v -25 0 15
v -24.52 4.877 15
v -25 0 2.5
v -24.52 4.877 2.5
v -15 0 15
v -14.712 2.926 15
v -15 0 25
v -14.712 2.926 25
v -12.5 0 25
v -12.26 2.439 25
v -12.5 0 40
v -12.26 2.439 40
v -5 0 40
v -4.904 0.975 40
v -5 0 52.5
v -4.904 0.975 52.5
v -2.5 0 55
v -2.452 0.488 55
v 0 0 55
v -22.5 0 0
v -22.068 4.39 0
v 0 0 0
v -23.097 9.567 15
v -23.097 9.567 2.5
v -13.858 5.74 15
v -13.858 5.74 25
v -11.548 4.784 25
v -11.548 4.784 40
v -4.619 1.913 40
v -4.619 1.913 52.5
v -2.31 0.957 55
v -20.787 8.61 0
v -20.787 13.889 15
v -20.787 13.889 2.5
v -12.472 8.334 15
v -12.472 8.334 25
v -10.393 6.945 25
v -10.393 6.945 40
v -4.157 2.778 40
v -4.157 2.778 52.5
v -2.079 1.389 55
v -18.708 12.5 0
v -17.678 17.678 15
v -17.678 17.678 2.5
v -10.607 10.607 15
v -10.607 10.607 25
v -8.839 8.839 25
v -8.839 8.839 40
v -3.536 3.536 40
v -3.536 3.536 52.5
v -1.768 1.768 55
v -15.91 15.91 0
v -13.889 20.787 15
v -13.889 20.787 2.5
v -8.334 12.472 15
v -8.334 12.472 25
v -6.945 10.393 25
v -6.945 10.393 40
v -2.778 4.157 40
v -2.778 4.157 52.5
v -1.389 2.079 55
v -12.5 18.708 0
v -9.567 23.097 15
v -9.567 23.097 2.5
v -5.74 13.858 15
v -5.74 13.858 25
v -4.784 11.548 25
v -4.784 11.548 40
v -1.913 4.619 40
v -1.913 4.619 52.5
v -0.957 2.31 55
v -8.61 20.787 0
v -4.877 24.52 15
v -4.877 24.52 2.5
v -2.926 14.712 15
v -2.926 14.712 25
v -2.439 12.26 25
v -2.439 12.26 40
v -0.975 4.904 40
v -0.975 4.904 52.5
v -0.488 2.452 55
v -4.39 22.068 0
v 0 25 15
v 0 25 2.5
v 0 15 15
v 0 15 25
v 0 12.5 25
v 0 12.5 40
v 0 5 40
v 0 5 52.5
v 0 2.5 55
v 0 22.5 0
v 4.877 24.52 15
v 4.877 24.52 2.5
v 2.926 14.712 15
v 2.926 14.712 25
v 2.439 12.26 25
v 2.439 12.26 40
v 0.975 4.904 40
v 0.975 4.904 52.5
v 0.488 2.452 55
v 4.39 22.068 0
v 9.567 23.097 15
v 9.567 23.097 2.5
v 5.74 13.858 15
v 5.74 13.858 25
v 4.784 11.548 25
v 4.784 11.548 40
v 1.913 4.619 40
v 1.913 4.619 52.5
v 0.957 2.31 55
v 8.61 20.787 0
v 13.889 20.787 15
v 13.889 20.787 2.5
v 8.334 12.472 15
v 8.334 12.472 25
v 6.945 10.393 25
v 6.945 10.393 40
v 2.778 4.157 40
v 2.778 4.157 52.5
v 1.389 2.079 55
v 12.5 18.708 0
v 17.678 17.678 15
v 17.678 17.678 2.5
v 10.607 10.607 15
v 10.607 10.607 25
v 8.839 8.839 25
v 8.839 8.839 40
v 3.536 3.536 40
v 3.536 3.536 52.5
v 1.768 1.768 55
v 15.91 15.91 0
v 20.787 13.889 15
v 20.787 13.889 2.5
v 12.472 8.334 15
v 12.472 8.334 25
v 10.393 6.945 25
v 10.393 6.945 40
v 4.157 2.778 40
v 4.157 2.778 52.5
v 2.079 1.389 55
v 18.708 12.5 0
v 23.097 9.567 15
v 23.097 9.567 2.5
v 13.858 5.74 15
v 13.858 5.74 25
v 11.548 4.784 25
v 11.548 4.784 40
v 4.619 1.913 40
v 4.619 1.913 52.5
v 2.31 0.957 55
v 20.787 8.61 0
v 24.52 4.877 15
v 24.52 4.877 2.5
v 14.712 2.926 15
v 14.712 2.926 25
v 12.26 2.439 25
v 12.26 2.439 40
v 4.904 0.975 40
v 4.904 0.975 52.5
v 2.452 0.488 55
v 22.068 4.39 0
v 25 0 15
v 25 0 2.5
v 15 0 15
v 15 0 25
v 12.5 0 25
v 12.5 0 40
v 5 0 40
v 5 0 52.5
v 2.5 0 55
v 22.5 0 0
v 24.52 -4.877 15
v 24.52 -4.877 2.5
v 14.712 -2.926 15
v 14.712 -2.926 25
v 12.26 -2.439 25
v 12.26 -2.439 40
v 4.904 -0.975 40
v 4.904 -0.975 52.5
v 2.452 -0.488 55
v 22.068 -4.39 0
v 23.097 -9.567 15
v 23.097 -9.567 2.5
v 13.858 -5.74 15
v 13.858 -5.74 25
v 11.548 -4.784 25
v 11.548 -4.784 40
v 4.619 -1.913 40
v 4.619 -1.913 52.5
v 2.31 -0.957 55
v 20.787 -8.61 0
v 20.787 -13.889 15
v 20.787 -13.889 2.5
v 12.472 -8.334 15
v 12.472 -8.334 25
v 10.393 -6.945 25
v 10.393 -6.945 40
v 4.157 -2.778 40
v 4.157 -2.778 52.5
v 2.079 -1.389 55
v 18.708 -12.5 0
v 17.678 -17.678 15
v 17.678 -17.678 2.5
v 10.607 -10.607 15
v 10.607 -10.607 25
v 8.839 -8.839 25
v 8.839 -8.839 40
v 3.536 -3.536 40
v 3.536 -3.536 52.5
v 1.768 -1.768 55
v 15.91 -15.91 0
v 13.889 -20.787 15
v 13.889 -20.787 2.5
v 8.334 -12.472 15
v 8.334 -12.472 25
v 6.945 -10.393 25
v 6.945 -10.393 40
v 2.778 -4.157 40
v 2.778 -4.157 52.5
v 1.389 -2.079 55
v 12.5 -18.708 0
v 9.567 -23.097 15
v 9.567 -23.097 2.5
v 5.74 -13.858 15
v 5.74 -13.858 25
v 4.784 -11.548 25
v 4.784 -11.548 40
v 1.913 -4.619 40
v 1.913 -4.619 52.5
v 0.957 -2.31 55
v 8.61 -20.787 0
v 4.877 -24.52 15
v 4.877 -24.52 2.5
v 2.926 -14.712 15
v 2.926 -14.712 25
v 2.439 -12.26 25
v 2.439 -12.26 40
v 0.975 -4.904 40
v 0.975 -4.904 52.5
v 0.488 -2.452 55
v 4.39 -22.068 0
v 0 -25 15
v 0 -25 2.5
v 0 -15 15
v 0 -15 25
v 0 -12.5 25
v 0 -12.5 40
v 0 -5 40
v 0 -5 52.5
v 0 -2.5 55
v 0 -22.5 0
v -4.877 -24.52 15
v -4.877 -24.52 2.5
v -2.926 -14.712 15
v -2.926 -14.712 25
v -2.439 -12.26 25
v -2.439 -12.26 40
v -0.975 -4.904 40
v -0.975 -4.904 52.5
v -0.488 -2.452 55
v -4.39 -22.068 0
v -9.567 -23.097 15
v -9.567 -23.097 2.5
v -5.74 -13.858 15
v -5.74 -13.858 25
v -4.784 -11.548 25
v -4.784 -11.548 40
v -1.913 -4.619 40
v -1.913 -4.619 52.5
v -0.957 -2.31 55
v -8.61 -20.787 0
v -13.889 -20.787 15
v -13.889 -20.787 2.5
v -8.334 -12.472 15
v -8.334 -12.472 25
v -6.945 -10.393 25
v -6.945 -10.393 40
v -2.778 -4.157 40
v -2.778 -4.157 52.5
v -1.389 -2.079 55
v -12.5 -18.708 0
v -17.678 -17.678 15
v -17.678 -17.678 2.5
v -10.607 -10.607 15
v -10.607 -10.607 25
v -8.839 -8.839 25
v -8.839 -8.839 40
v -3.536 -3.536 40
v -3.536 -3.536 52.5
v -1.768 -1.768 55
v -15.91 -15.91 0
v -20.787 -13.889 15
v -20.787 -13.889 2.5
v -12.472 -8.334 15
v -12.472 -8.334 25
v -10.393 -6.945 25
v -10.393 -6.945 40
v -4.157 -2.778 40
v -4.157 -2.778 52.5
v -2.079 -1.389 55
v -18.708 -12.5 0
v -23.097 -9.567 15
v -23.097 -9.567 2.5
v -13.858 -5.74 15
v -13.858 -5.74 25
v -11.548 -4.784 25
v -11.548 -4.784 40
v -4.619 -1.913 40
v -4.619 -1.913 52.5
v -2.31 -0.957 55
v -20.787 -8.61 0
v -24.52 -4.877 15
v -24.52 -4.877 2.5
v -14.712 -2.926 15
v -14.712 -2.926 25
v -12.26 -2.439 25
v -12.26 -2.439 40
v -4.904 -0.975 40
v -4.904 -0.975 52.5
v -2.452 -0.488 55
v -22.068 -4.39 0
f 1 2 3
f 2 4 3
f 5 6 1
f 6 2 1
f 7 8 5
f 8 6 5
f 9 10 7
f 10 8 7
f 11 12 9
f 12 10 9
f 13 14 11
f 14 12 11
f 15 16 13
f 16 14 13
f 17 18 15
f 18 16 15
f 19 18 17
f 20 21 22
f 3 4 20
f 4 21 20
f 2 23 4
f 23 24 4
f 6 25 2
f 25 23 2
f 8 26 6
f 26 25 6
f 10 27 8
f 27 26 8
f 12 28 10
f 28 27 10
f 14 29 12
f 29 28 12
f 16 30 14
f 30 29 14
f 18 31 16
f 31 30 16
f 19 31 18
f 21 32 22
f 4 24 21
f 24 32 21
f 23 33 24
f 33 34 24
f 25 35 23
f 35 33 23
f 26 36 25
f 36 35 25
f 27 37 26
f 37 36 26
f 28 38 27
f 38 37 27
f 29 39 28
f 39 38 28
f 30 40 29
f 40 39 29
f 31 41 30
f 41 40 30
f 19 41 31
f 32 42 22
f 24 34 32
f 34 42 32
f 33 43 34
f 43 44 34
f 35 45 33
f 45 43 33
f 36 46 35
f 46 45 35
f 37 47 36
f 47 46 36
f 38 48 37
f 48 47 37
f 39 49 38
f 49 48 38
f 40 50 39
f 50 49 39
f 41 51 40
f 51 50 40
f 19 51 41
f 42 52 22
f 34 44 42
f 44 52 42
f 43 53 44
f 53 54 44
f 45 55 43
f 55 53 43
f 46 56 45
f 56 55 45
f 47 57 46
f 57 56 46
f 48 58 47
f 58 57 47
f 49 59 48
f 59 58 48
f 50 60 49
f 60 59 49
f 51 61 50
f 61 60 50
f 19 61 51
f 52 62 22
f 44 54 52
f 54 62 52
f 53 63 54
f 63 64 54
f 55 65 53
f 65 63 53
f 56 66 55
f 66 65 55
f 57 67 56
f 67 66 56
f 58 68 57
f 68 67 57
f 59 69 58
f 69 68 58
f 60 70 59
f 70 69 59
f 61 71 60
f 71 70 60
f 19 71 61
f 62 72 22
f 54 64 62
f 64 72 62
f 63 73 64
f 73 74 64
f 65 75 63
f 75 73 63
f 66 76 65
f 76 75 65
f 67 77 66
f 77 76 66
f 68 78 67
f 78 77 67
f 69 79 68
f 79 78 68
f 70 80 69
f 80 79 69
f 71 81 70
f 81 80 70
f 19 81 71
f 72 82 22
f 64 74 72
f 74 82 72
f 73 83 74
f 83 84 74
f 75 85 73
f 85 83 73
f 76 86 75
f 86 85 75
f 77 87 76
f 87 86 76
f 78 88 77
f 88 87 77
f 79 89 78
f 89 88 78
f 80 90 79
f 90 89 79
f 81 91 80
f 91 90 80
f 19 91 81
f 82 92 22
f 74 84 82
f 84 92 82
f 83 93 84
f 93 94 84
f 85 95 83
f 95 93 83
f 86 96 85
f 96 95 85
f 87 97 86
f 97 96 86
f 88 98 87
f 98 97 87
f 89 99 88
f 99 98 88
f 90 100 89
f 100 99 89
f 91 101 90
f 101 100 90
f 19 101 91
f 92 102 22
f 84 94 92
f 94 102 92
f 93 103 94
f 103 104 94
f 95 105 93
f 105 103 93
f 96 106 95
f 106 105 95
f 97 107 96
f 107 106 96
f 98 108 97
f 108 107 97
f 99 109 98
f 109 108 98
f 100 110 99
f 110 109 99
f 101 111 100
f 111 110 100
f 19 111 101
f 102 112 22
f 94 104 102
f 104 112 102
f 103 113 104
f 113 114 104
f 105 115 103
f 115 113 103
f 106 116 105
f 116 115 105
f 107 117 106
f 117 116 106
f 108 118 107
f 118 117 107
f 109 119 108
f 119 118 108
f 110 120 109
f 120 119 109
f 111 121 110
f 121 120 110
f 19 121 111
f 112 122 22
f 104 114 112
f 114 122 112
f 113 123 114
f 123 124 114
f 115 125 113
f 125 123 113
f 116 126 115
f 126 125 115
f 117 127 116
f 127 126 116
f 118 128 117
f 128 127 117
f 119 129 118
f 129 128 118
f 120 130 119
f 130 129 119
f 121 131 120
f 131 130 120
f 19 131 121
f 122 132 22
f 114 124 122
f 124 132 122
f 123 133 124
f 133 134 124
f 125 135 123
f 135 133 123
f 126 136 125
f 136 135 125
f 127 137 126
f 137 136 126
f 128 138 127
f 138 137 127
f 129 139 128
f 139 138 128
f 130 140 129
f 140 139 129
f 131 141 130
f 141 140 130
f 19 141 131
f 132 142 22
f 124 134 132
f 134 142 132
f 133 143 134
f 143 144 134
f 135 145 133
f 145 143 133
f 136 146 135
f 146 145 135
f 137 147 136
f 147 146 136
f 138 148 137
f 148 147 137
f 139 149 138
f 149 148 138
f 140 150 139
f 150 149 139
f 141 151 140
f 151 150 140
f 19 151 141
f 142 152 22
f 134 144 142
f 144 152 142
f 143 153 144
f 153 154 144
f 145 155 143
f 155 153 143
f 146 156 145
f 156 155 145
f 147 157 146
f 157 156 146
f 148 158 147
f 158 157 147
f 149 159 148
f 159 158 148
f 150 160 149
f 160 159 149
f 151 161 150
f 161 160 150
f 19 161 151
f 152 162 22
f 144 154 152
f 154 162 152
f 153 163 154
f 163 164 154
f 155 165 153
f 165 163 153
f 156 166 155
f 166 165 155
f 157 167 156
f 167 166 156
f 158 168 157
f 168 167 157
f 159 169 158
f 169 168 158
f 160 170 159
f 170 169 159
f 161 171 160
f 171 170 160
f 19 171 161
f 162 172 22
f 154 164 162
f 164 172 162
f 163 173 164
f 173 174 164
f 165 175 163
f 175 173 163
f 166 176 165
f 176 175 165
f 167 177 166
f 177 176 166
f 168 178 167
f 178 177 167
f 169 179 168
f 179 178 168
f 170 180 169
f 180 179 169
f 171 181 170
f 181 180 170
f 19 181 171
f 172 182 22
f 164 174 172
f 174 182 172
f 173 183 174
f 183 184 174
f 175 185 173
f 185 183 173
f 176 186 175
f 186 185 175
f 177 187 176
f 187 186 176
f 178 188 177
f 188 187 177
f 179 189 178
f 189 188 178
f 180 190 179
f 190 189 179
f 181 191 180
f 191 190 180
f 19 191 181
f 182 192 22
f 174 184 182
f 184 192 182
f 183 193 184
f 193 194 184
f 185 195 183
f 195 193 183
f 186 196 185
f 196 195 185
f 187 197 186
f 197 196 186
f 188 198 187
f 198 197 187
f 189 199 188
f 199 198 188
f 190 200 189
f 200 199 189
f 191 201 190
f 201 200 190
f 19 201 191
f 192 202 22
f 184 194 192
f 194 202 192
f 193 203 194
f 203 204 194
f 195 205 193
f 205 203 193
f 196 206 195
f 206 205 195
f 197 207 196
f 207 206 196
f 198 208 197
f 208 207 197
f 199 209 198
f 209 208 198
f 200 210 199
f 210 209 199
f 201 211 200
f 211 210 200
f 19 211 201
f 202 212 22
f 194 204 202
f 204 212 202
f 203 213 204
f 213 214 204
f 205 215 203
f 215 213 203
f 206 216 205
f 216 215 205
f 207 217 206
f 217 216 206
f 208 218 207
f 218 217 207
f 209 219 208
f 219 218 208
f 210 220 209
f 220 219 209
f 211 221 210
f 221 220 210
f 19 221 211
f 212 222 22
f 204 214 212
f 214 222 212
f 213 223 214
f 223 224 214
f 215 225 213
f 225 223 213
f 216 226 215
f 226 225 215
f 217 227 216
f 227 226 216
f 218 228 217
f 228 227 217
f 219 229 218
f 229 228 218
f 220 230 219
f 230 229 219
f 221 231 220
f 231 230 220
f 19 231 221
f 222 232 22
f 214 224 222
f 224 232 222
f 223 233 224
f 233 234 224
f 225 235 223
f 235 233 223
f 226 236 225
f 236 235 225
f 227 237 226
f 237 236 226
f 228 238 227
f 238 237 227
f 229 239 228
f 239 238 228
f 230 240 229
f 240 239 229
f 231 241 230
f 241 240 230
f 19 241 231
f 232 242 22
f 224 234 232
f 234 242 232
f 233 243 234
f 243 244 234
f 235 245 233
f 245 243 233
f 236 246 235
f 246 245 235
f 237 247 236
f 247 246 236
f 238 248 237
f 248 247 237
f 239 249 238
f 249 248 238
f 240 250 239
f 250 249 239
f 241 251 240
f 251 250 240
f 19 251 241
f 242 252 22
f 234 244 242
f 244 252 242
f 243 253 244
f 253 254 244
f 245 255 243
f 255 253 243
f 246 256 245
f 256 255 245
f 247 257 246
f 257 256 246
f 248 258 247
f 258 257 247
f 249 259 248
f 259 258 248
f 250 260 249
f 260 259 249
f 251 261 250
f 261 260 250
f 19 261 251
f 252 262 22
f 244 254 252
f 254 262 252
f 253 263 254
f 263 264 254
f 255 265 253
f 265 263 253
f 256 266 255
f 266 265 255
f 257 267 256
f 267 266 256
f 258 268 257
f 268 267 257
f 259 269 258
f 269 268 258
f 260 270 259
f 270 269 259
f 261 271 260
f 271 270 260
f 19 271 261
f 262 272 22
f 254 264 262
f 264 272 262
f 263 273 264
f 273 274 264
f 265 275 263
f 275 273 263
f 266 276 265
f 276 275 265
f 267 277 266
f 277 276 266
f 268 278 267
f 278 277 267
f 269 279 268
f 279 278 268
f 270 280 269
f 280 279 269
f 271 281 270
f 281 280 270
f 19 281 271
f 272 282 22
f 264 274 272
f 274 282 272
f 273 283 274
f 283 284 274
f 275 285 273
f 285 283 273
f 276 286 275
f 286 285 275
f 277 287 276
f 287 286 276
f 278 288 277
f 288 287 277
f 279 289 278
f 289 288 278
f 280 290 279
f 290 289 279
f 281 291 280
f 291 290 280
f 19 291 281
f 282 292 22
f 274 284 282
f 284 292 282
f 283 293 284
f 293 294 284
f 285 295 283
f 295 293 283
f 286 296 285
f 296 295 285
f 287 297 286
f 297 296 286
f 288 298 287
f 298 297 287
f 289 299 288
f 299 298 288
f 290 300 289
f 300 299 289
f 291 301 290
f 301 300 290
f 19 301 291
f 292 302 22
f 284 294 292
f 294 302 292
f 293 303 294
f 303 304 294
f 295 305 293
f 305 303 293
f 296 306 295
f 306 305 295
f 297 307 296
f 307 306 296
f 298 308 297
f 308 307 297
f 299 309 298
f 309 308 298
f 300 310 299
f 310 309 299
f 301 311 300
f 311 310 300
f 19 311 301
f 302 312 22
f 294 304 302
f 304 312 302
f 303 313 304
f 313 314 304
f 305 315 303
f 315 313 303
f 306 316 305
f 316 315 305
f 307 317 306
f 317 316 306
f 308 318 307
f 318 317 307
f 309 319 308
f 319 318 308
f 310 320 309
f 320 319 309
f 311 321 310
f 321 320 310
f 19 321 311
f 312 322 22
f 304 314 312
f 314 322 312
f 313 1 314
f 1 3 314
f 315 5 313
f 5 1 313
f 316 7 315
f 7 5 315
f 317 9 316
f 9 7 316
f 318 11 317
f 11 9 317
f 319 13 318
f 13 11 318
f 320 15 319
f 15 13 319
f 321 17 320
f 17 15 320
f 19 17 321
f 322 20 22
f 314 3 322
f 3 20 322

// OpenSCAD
$fn = 32;

// ----------------------------------------------------------------------
// Stepped shaft: diameters 50, 30, 25, 10 mm, 55 mm long
// ----------------------------------------------------------------------

// --- parameters (mm) ---
d1 = 50;                  // step 1 diameter
len1 = 15;                // step 1 length
d2 = 30;                  // step 2 diameter
len2 = 10;                // step 2 length
d3 = 25;                  // step 3 diameter
len3 = 15;                // step 3 length
d4 = 10;                  // step 4 diameter
len4 = 15;                // step 4 length
total = 55;               // overall length
chamfer = 2.5;            // end chamfer

/* closed turning profile: x is the radius, y is the length */
profile = [[0, 0], [25 - chamfer, 0], [25, chamfer], [25, 15], [15, 15], [15, 25], [12.5, 25], [12.5, 40], [5, 40], [5, 52.5], [2.5, 55], [0, 55]];

difference() {
  rotate_extrude() polygon(profile);
}
